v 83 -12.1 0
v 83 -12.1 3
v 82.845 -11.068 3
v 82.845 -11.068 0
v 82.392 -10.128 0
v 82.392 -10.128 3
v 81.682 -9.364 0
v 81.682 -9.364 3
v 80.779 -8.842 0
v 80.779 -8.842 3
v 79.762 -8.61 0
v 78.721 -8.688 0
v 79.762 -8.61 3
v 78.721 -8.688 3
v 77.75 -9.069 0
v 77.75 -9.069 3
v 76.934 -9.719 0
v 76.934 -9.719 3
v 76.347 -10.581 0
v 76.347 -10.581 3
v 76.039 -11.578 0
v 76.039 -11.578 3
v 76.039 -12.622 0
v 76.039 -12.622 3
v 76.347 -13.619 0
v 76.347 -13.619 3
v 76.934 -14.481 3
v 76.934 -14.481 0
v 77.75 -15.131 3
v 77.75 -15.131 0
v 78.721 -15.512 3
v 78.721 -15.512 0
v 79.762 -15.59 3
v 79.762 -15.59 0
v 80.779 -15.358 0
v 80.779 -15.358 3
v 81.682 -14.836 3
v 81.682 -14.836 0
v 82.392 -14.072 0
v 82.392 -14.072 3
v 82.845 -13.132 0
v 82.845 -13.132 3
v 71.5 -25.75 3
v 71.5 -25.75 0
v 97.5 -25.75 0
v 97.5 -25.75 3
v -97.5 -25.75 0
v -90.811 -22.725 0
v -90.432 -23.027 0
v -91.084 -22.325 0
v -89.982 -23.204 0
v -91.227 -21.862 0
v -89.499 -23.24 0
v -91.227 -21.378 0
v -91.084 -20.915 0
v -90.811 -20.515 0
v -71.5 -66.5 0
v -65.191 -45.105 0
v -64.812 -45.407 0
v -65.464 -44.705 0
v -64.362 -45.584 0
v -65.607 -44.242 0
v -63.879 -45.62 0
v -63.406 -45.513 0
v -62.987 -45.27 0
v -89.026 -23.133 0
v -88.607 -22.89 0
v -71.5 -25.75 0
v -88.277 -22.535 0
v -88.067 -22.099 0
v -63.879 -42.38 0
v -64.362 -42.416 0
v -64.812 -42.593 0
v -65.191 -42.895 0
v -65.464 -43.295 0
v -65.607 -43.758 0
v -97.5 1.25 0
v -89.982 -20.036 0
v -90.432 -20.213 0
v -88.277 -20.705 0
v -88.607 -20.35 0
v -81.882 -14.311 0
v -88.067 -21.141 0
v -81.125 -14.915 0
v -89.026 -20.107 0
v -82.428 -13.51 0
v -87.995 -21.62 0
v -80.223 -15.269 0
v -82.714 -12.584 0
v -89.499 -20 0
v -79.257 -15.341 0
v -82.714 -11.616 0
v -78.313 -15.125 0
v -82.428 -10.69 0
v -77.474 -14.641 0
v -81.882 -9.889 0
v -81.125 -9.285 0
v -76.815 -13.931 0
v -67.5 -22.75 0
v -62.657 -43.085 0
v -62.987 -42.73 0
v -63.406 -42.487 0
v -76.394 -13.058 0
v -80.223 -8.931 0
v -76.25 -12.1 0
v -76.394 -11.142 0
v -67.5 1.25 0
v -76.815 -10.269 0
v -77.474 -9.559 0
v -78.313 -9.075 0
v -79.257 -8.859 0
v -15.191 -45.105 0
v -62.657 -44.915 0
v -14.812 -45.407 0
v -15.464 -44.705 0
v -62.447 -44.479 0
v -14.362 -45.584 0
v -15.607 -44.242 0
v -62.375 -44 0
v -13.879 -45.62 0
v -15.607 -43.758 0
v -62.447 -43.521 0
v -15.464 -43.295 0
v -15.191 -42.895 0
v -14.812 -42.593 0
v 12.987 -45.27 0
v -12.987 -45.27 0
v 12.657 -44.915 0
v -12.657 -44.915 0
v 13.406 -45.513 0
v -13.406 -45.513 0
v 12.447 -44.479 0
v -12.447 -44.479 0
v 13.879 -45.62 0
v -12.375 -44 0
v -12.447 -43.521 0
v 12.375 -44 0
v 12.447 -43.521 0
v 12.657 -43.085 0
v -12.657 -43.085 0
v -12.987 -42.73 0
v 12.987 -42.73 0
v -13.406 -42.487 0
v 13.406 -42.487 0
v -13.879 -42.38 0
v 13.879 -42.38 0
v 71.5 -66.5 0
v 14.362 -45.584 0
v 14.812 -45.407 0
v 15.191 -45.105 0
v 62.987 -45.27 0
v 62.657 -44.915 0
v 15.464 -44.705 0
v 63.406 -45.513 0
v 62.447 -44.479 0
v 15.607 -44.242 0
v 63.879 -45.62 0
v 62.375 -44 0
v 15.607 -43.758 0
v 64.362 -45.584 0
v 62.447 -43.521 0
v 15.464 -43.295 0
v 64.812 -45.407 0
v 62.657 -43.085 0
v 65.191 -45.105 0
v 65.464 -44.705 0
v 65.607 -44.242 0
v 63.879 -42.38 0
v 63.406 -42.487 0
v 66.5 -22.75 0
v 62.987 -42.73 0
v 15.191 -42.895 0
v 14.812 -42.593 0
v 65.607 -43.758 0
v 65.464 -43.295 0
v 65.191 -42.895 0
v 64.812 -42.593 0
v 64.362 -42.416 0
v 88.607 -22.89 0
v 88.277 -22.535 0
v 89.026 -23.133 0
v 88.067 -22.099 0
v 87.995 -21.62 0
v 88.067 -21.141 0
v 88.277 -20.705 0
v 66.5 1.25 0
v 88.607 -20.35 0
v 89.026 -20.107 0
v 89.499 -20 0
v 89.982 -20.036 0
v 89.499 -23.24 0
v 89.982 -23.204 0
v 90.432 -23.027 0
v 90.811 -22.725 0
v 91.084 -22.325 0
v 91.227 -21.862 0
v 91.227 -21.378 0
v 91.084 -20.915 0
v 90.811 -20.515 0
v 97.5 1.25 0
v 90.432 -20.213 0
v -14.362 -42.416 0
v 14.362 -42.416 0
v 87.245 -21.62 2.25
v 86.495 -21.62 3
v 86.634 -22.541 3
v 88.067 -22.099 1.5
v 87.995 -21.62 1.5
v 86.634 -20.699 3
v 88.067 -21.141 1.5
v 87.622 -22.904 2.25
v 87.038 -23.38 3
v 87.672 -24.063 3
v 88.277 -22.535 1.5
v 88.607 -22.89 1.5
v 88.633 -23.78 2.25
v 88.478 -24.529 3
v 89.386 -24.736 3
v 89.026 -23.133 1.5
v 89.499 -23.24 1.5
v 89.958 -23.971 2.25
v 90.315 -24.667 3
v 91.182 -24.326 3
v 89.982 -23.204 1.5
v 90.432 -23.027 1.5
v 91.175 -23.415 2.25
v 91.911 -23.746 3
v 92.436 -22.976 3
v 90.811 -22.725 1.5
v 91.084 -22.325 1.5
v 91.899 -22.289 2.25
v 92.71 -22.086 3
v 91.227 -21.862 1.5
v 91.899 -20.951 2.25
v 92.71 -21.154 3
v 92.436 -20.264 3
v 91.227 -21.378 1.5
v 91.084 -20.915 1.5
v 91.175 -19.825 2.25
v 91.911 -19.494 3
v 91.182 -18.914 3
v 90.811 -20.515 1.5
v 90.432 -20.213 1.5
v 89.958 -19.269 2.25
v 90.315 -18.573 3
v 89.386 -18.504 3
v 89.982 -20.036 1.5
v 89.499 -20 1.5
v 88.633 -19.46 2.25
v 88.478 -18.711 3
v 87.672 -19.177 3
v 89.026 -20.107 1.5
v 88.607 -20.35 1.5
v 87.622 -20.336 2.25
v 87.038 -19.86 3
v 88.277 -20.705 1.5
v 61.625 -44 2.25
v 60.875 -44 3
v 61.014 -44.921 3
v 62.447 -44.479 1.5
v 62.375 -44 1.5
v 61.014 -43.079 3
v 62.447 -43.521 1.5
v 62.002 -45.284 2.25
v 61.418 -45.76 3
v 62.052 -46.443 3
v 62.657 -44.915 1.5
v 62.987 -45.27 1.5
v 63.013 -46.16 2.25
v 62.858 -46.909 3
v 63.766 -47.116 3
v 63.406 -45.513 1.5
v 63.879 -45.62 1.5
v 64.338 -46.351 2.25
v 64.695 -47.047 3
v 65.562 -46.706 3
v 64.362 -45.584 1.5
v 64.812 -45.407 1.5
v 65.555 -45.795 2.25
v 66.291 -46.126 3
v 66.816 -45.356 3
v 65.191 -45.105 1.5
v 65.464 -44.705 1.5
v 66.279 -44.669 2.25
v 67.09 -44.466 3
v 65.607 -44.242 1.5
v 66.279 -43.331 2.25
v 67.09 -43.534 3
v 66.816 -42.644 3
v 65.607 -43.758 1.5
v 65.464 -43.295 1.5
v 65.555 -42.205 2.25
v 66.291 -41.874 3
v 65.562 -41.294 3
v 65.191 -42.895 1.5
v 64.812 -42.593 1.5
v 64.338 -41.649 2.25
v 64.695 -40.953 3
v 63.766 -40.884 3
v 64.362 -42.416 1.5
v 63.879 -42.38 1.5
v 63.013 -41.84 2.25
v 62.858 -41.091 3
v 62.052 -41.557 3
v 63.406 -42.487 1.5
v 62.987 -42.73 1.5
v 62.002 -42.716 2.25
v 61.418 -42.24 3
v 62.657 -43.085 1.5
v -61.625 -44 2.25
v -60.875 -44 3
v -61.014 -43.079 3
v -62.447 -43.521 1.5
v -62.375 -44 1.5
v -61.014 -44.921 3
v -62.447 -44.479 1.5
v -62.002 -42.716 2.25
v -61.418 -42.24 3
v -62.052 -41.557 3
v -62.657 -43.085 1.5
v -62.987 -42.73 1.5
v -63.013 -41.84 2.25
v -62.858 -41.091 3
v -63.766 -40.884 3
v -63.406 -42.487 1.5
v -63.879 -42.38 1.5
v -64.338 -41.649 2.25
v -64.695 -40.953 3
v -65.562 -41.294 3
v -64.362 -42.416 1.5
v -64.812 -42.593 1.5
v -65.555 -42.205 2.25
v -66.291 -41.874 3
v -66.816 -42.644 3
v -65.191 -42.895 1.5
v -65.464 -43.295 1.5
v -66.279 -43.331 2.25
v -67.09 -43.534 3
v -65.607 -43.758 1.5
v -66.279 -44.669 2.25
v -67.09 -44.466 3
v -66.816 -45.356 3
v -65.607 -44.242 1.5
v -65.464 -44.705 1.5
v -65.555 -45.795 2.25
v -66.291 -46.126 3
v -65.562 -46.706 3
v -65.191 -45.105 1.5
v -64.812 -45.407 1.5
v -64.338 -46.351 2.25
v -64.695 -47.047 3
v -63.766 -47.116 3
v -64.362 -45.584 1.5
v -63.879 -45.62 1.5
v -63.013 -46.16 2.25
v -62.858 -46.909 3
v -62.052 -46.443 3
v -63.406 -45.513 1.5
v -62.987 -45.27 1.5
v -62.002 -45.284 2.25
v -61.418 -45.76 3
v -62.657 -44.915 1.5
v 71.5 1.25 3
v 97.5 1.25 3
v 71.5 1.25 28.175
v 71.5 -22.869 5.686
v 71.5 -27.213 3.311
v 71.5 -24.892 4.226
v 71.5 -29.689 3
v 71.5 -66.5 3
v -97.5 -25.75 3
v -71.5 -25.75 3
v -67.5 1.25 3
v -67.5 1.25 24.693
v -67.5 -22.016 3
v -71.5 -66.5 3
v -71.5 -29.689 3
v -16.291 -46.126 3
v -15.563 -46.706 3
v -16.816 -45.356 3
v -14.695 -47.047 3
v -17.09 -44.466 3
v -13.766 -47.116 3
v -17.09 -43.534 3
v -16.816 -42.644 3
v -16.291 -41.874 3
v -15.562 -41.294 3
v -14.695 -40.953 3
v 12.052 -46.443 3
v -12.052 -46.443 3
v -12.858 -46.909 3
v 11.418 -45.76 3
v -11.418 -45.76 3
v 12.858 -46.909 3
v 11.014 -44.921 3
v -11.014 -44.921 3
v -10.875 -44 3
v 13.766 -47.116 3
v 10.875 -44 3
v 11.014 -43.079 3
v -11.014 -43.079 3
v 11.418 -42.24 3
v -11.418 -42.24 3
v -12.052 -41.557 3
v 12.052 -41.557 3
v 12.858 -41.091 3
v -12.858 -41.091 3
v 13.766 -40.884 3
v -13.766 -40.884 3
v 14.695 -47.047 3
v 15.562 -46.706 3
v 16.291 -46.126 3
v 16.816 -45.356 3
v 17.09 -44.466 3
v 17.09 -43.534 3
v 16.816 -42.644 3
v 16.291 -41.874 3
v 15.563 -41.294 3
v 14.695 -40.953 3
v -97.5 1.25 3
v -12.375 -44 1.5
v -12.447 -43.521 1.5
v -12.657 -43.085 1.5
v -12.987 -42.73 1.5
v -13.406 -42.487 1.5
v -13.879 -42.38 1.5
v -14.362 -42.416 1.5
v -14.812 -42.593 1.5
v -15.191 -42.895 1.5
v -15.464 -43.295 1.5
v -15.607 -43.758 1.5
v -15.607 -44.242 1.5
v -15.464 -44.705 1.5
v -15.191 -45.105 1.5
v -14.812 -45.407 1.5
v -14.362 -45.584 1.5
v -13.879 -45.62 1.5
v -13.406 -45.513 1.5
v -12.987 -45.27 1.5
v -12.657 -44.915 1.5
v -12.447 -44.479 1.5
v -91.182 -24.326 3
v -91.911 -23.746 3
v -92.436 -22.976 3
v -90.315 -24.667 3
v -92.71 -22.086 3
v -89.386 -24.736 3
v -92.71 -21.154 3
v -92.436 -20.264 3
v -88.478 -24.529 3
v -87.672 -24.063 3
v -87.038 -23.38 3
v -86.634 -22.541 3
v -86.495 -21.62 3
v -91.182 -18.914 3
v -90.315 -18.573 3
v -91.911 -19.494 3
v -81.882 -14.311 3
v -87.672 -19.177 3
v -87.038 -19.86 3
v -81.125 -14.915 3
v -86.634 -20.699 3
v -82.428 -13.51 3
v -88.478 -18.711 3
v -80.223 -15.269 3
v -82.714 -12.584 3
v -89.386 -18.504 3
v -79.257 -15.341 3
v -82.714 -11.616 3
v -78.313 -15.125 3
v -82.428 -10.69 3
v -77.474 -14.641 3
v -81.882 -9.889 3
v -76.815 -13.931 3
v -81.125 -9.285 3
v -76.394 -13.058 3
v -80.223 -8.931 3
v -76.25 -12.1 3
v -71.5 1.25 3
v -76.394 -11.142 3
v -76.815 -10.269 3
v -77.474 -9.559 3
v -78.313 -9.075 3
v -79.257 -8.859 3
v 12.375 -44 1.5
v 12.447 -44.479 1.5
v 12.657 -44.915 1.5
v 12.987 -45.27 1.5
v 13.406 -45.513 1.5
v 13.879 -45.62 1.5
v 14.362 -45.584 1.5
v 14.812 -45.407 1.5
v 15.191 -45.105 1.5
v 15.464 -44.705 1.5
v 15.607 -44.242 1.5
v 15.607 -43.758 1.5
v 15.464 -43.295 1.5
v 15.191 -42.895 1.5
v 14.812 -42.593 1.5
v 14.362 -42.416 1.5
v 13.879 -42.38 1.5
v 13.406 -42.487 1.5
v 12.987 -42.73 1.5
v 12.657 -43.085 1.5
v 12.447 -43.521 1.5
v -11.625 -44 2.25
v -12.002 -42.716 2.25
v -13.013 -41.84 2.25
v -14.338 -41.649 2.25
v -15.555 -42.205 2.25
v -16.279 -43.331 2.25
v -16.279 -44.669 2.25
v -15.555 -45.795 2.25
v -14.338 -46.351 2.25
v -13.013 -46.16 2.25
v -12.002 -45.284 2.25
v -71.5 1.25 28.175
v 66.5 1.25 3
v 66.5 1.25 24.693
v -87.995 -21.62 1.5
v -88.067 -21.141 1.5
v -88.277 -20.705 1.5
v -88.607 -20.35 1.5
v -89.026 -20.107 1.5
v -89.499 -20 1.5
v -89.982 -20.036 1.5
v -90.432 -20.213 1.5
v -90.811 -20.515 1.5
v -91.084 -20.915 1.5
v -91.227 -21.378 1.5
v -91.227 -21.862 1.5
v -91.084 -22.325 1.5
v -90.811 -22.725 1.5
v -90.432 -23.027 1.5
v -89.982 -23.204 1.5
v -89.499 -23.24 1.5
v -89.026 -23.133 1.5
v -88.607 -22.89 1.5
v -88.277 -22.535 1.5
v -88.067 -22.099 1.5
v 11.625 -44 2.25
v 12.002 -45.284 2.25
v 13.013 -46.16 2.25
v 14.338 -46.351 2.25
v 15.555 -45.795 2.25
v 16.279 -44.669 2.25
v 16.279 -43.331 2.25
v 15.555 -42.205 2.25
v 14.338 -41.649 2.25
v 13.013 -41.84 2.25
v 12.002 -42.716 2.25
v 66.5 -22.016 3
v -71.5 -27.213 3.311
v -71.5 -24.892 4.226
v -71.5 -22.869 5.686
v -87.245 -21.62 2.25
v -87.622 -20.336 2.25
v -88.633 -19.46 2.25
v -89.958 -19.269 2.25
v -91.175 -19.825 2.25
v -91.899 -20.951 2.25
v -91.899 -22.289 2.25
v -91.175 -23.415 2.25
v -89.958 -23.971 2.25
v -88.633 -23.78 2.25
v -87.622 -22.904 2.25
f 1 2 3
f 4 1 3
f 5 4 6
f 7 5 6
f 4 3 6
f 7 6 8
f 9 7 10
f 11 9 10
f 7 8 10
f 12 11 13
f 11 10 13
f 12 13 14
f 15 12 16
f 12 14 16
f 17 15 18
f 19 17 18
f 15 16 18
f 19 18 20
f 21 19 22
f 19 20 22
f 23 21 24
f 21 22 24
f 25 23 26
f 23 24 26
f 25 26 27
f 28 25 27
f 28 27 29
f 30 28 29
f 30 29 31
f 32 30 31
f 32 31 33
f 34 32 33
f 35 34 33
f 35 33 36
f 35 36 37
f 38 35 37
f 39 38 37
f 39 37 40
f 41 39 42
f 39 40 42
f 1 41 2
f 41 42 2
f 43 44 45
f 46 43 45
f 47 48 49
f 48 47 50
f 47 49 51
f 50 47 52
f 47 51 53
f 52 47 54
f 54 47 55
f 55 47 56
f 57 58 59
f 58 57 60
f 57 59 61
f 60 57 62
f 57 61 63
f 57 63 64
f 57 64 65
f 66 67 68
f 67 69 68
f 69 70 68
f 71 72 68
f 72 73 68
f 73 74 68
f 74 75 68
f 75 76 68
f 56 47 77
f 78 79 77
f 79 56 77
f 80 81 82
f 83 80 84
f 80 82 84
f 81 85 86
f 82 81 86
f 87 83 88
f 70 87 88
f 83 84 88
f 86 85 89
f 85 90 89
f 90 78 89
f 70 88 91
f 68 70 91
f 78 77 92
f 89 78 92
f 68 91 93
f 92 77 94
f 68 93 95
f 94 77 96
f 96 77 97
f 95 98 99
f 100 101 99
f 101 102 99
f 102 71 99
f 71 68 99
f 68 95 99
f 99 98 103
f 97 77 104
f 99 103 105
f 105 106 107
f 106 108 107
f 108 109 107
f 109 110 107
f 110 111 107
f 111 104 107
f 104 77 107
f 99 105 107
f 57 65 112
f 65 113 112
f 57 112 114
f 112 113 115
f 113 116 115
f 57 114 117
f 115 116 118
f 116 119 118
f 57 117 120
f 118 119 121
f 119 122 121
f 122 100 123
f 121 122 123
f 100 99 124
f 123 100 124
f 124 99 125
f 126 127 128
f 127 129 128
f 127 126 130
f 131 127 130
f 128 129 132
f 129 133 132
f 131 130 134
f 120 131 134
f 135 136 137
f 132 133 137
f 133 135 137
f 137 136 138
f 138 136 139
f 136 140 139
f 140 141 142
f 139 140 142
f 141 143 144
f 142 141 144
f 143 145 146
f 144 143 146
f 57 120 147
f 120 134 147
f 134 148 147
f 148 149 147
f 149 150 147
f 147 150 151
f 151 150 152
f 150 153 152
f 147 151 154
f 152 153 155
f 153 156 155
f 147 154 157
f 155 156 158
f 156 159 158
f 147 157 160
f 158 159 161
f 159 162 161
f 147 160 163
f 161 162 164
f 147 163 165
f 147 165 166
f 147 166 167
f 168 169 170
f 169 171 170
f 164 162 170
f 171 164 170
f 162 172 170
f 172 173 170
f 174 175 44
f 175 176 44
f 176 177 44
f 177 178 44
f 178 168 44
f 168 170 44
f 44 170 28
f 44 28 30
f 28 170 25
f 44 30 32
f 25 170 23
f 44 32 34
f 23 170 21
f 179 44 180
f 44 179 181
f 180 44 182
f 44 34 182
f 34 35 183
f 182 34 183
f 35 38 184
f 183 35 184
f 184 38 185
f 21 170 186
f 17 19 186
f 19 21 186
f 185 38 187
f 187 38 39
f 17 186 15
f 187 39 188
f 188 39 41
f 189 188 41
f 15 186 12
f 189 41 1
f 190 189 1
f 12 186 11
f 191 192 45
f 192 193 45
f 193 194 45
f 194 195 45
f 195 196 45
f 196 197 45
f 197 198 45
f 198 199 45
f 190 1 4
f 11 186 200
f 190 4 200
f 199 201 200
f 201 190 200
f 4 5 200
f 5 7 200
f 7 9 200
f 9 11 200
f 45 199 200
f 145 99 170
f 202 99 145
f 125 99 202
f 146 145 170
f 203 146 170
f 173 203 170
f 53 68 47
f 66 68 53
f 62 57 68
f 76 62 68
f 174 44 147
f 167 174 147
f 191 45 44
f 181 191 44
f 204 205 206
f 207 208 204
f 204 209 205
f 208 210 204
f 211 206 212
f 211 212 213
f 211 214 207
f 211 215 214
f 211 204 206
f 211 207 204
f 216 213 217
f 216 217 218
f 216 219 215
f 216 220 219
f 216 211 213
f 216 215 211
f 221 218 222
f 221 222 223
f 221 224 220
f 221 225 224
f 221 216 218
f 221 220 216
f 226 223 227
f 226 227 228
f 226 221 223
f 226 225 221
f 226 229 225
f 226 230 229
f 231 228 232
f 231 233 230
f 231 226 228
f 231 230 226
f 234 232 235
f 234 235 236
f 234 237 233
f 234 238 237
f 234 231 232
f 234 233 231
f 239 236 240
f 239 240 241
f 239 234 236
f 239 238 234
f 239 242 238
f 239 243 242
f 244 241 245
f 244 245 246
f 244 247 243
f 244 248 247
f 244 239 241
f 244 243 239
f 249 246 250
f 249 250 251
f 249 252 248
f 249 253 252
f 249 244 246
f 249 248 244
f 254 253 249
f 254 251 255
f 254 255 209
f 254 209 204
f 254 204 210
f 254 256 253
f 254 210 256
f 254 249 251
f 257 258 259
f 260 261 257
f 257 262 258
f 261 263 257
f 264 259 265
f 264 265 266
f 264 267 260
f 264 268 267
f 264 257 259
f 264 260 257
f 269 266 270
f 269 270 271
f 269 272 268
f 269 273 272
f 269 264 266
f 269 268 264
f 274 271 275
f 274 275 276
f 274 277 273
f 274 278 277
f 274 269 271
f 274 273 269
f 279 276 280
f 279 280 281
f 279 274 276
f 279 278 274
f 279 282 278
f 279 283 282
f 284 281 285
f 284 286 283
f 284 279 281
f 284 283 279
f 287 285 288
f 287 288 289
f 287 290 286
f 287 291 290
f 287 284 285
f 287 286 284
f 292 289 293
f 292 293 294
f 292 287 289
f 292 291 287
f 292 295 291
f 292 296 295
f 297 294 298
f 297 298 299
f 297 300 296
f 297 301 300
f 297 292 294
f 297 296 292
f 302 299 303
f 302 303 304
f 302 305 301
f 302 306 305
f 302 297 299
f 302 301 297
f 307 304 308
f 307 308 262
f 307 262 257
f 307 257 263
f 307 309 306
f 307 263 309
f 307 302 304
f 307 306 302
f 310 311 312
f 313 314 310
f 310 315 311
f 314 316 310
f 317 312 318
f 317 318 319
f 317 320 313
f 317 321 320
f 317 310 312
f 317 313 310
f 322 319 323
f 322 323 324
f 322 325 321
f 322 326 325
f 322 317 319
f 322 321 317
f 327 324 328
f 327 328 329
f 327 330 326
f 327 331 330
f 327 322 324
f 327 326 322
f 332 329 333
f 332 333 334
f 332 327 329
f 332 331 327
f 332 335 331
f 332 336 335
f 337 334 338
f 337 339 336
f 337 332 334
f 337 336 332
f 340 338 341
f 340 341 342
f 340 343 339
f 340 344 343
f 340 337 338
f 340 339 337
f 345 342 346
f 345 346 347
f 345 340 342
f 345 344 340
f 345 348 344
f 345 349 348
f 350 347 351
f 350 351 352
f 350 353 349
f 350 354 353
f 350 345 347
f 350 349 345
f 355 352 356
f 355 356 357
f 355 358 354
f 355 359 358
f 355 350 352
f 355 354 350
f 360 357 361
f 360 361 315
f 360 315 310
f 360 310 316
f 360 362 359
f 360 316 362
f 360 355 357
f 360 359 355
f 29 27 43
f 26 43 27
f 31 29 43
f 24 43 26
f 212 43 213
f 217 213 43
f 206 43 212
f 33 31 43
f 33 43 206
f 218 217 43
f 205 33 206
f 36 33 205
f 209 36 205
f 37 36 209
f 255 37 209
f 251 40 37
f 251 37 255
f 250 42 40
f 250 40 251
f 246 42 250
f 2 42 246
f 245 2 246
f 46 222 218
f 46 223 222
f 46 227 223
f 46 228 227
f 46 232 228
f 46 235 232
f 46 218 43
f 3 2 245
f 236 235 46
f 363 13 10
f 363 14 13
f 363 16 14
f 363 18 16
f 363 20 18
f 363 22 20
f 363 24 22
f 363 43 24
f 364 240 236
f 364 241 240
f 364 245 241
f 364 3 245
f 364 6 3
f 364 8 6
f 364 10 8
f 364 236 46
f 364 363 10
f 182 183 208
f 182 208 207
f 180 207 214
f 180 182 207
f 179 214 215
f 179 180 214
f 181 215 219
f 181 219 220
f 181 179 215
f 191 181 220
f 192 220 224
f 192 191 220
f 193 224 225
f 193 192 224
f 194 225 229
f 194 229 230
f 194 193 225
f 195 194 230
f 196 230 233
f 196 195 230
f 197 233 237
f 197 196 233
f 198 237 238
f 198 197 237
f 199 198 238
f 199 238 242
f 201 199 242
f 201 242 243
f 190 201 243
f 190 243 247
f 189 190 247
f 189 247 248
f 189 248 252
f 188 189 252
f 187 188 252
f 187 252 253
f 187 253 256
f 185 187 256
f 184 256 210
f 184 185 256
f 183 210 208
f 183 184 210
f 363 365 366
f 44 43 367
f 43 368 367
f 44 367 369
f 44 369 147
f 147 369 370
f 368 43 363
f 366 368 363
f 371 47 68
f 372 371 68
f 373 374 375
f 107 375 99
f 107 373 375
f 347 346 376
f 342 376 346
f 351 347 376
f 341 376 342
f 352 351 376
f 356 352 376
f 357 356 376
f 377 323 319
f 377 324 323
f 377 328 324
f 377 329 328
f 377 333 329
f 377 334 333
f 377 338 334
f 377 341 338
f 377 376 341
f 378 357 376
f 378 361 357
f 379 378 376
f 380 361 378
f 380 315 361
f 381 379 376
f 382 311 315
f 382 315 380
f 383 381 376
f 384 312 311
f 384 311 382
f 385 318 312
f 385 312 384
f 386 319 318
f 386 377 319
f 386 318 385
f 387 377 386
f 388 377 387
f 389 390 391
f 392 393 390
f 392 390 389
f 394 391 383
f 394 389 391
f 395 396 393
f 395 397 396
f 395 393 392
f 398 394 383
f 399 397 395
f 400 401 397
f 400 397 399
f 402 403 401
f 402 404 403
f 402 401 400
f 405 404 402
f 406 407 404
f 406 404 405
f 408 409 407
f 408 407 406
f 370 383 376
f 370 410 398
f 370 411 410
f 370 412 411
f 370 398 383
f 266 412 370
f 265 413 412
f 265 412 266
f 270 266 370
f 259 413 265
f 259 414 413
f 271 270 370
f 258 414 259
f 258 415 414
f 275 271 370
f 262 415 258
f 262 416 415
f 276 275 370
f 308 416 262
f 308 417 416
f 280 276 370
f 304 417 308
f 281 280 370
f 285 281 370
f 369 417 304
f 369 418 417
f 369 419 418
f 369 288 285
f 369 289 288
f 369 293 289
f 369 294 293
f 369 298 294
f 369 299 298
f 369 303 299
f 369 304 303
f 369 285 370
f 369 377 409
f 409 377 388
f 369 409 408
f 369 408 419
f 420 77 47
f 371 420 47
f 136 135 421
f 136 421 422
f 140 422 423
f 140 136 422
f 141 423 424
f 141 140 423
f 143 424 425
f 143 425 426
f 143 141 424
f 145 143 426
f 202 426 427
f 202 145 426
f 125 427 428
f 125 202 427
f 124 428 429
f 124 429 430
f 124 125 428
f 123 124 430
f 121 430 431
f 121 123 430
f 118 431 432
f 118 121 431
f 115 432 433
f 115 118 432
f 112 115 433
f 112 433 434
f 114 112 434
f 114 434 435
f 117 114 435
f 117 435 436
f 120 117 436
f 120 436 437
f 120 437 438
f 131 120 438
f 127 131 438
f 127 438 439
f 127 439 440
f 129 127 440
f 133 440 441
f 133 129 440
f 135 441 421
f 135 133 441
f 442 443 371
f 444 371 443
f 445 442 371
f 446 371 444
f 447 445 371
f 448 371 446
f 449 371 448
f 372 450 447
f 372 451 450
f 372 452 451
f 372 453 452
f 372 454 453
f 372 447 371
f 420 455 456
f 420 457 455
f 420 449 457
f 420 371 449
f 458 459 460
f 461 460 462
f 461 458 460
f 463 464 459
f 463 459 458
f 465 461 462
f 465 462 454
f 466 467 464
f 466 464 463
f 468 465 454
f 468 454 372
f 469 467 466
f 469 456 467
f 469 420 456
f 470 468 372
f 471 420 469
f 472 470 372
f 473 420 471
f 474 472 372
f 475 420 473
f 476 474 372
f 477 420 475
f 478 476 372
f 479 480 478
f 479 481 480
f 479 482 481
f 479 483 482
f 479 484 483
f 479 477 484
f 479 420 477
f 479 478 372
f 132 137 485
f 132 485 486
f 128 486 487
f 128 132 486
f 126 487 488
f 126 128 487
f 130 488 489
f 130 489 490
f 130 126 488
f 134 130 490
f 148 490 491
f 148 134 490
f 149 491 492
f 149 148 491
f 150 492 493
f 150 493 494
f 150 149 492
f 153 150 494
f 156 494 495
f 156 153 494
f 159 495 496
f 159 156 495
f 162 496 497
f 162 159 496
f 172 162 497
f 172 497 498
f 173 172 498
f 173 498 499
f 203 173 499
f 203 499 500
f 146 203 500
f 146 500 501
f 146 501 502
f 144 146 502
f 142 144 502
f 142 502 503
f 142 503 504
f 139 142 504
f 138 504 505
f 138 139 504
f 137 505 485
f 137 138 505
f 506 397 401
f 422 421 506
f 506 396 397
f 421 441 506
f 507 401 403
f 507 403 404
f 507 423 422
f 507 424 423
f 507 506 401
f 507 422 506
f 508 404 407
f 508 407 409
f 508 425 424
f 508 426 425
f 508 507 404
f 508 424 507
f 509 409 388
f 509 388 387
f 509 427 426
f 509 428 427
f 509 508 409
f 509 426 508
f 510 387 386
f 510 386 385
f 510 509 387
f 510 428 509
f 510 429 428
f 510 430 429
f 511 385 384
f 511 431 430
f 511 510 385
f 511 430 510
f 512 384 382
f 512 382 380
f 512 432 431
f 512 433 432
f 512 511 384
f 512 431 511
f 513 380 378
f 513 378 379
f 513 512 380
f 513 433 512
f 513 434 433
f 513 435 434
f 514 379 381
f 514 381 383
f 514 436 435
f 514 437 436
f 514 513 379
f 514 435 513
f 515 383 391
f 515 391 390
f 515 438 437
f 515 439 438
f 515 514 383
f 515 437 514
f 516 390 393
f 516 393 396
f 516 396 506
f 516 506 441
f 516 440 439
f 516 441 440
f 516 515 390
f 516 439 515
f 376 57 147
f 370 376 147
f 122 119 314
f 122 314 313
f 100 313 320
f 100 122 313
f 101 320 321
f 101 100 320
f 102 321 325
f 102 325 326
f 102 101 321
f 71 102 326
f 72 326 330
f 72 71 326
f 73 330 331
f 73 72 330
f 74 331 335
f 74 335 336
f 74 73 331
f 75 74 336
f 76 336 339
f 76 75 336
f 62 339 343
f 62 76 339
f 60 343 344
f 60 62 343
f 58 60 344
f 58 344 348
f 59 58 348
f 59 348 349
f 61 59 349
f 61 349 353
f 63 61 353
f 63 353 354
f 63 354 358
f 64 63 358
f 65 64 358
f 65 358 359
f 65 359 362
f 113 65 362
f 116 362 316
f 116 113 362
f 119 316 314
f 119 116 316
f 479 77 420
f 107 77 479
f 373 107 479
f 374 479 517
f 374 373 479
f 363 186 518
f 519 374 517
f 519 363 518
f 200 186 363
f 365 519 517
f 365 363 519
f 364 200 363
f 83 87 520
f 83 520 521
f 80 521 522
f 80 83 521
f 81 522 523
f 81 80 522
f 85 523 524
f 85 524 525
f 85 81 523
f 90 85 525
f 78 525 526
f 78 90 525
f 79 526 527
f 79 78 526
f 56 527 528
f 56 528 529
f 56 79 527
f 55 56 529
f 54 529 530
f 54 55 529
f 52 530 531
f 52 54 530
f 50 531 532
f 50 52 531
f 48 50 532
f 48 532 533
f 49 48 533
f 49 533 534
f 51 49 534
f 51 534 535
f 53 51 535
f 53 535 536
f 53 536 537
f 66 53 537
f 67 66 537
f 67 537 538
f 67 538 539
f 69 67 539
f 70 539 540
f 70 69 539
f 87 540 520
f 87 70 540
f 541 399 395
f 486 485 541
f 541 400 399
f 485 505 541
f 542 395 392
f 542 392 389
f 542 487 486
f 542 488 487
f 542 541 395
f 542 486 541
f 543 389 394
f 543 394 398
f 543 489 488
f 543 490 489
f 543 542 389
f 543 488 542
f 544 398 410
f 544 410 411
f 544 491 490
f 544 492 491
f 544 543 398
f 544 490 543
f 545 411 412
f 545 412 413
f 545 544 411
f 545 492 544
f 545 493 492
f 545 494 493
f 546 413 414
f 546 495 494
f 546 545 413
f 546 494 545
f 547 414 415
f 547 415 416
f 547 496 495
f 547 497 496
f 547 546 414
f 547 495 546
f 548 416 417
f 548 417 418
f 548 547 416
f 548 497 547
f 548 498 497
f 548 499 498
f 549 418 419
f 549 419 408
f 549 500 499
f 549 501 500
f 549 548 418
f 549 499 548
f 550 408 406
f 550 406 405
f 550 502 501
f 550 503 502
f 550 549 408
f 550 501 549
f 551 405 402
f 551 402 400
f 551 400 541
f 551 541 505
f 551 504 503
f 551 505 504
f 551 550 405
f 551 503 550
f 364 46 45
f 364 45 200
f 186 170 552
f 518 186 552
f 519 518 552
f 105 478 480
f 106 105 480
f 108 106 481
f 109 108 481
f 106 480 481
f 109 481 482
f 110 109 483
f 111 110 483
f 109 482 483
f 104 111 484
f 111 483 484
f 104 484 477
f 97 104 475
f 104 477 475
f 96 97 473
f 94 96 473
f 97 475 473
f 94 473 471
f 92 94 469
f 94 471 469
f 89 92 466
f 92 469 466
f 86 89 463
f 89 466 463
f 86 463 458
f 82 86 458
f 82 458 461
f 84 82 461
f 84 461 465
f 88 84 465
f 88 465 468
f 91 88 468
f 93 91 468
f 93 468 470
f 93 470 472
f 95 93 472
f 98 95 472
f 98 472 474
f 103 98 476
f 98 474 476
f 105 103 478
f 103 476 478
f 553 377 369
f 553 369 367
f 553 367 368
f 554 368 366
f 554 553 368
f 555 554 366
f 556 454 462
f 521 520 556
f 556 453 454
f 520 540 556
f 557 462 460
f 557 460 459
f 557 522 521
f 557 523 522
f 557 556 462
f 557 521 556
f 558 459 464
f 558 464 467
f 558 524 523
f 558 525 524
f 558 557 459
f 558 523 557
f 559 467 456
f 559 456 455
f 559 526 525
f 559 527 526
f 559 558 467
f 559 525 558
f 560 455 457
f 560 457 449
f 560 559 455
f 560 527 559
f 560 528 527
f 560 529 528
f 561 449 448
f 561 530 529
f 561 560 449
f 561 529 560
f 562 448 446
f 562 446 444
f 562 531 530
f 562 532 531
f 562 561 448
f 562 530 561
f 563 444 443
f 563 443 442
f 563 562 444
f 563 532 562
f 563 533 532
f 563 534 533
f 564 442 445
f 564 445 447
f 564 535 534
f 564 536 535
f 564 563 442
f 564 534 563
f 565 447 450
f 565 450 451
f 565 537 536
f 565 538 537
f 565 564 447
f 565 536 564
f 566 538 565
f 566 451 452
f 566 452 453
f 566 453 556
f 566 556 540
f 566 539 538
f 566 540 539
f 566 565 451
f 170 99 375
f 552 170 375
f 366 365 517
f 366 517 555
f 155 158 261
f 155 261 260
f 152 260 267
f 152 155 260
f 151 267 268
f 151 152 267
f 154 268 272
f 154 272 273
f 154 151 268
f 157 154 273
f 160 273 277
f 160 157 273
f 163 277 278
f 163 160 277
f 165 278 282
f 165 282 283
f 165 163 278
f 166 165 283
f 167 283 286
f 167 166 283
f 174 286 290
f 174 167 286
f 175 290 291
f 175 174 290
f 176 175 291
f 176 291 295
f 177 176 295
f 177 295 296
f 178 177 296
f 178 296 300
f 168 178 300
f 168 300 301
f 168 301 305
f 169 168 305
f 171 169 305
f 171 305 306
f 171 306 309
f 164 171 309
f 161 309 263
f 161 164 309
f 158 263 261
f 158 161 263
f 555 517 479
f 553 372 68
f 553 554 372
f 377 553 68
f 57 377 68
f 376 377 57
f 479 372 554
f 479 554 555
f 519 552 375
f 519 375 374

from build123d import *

# Parameters (mm, degrees)
CROQUIS1_R                  = 1.625
SALIENTE_EXTRUIR1_DEPTH     = 3
CROQUIS2_W                  = 143
CROQUIS2_H                  = 24
SALIENTE_EXTRUIR2_DEPTH     = 13
CORTAR_EXTRUIR1_START       = -4
CORTAR_EXTRUIR1_DEPTH       = 134
CORTAR_EXTRUIR2_DEPTH       = 183.316345948
CORTAR_EXTRUIR2_DEPTH_BACK  = 183.316345948
SALIENTE_EXTRUIR3_DEPTH     = 1
CHAFL_N1_SIZE               = 1.5
CROQUIS7_R                  = 6
CORTAR_EXTRUIR3_DEPTH       = 10
CROQUIS11_R                 = 5
CORTAR_EXTRUIR7_DEPTH       = 60
CORTAR_EXTRUIR8_DEPTH       = 183.40682554
CORTAR_EXTRUIR8_DEPTH_BACK  = 183.40682554
CROQUIS12_W                 = 39.754544999
CROQUIS12_H                 = 27.919936099
CORTAR_EXTRUIR9_DEPTH       = 119.057189531
CORTAR_EXTRUIR9_DEPTH_BACK  = 119.057189531
CROQUIS13_W                 = 134.117881028
CROQUIS13_H                 = 3.734427539
CORTAR_EXTRUIR10_DEPTH      = 207.049144623
CORTAR_EXTRUIR10_DEPTH_BACK = 207.049144623
CROQUIS14_W                 = 4.069621889
CROQUIS14_H                 = 4.224509549
CROQUIS22_W                 = 31
CROQUIS22_H                 = 6.734427539
SALIENTE_EXTRUIR9_DEPTH     = 3
CROQUIS23_W                 = 15.138367264
CROQUIS23_H                 = 34.152206442
CORTAR_EXTRUIR11_DEPTH      = 10
SALIENTE_EXTRUIR4_START     = -5
SALIENTE_EXTRUIR4_DEPTH     = 5
SALIENTE_EXTRUIR5_START     = -4
SALIENTE_EXTRUIR5_DEPTH     = 4
SALIENTE_EXTRUIR6_START     = -138
SALIENTE_EXTRUIR6_DEPTH     = 134
CROQUIS18_R                 = 6
SALIENTE_EXTRUIR7_DEPTH     = 3
REDONDEO1_R                 = 10
CROQUIS19_R                 = 5
CROQUIS19_R_2               = 3.25
CROQUIS19_R_3               = 3.5
SALIENTE_EXTRUIR8_DEPTH     = 3


with BuildPart() as part:
    # Croquis1 → Saliente-Extruir1 (new body)
    with BuildSketch(Plane.XY):
        Polygon((-97.5, -1.75), (-97.5, -25.75), (-71.5, -25.75), (-71.5, -66.5), (71.5, -66.5), (71.5, -25.75), (97.5, -25.75), (97.5, -1.75), align=None)
        with Locations((-89.62, -21.62)):
            Circle(CROQUIS1_R, mode=Mode.SUBTRACT)
        with Locations((-64, -44)):
            Circle(CROQUIS1_R, mode=Mode.SUBTRACT)
        with Locations((-14, -44)):
            Circle(CROQUIS1_R, mode=Mode.SUBTRACT)
        with Locations(Location((14, -44, 0), (0, 0, 180))):
            Circle(CROQUIS1_R, mode=Mode.SUBTRACT)
        with Locations(Location((64, -44, 0), (0, 0, 180))):
            Circle(CROQUIS1_R, mode=Mode.SUBTRACT)
        with Locations(Location((89.62, -21.62, 0), (0, 0, 180))):
            Circle(CROQUIS1_R, mode=Mode.SUBTRACT)
    extrude(amount=SALIENTE_EXTRUIR1_DEPTH)

    # Croquis2 → Saliente-Extruir2 (add)
    with BuildSketch(Plane.XY.offset(3)):
        with Locations((0, -13.75)):
            Rectangle(CROQUIS2_W, CROQUIS2_H)
    extrude(amount=SALIENTE_EXTRUIR2_DEPTH)

    # Croquis4 → Cortar-Extruir1 (cut)
    with BuildSketch(Plane.ZY.offset(71.5).offset(CORTAR_EXTRUIR1_START)):
        Polygon((0, -22.75), (12.254442441, -19.75), (12.254442441, -7.75), (0, -4.75), align=None)
    extrude(amount=-CORTAR_EXTRUIR1_DEPTH, mode=Mode.SUBTRACT)

    # Croquis5 → Cortar-Extruir2 (cut, two sides: drawn at the far end of the back side and taken through both)
    with BuildSketch(Plane.ZY.offset(71.5).offset(-CORTAR_EXTRUIR2_DEPTH_BACK)):
        Polygon((3, -25.75), (16, -22.567480666), (16, -5.666946873), (0, -1.75), (13.126652557, 3.411104472), (22.490929508, -3.111277484), (22.490929508, -28.232984682), align=None)
    extrude(amount=CORTAR_EXTRUIR2_DEPTH + CORTAR_EXTRUIR2_DEPTH_BACK, mode=Mode.SUBTRACT)

    # Croquis6 → Saliente-Extruir3 (add)
    # profile 1 of 3: a face of its own
    with BuildSketch(Plane.XY.offset(16)):
        with BuildLine():
            Line((-11.048076923, -8.067480666), (-8.963942308, -8.067480666))
            add(Edge.make_bspline(
                [(-8.963942308, -8.067480666), (-8.809276988, -8.068112716), (-8.511063659, -8.069331385), (-8.082223191, -8.086660848), (-7.688620597, -8.112805667), (-7.330723888, -8.147308935), (-7.008234257, -8.195180289), (-6.72182234, -8.25265944), (-6.469658762, -8.316670483), (-6.318437154, -8.376153718), (-6.247596154, -8.404019127)],
                knots=[0, 0, 0, 0, 1.348808202, 2.600664361, 3.742342956, 4.788858012, 5.735658768, 6.584006912, 7.336666444, 8, 8, 8, 8], degree=3))
            add(Edge.make_bspline(
                [(-6.247596154, -8.404019127), (-6.167838297, -8.439986111), (-6.01192431, -8.510295871), (-5.788508653, -8.62947523), (-5.57929728, -8.757863745), (-5.387757493, -8.900302082), (-5.209847212, -9.050792623), (-5.046669639, -9.210766732), (-4.899538696, -9.382679515), (-4.766910273, -9.563447492), (-4.648977655, -9.752836862), (-4.547744652, -9.951781558), (-4.460210228, -10.158597262), (-4.391853098, -10.375534491), (-4.335040106, -10.599989157), (-4.298295523, -10.833377416), (-4.27243642, -11.07491201), (-4.270311593, -11.238882429), (-4.269230769, -11.322288358)],
                knots=[0, 0, 0, 0, 1.116361014, 2.182309107, 3.229450697, 4.24598407, 5.225421932, 6.201651319, 7.158895679, 8.110002388, 9.060669178, 10.002827475, 10.956240434, 11.923213192, 12.902917952, 13.908279153, 14.936015885, 16, 16, 16, 16], degree=3))
            add(Edge.make_bspline(
                [(-4.269230769, -11.322288358), (-4.271772595, -11.424925094), (-4.276790571, -11.627546629), (-4.309579081, -11.926339339), (-4.370733726, -12.213061963), (-4.453090589, -12.488617706), (-4.555124128, -12.754790758), (-4.686709728, -13.006949511), (-4.838806317, -13.249487522), (-5.014462356, -13.47922496), (-5.210800272, -13.698269295), (-5.437501776, -13.893729522), (-5.68202542, -14.078750894), (-5.954416581, -14.240928545), (-6.247183828, -14.39157714), (-6.567004768, -14.519215786), (-6.907876863, -14.637006555), (-7.14689016, -14.695959195), (-7.269230769, -14.726134512)],
                knots=[0, 0, 0, 0, 0.995453645, 1.965186658, 2.910129054, 3.83459069, 4.752398018, 5.669942118, 6.588407184, 7.525617038, 8.471772905, 9.435289717, 10.423772802, 11.441988612, 12.505459691, 13.613754905, 14.778583949, 16, 16, 16, 16], degree=3))
            Line((-7.269230769, -14.726134512), (-4.5, -20.067480666))
            Line((-4.5, -20.067480666), (-6.90625, -20.067480666))
            Line((-6.90625, -20.067480666), (-9.617788462, -14.836711435))
            Line((-9.617788462, -14.836711435), (-9.822115385, -14.836711435))
            Line((-9.822115385, -14.836711435), (-10.557692308, -20.067480666))
            Line((-10.557692308, -20.067480666), (-12.730769231, -20.067480666))
            Line((-12.730769231, -20.067480666), (-11.048076923, -8.067480666))
        make_face()
        with BuildLine():
            add(Edge.make_bspline(
                [(-9.540865385, -12.836711435), (-9.386195416, -12.835275241), (-9.090350679, -12.832528164), (-8.667825913, -12.813420248), (-8.28680605, -12.783236682), (-7.948389952, -12.740102395), (-7.651687406, -12.689090143), (-7.397958815, -12.625404989), (-7.186041205, -12.549684501), (-7.012592097, -12.459887562), (-6.872086372, -12.354457197), (-6.750472631, -12.241946473), (-6.649207312, -12.116003172), (-6.565654347, -11.978741621), (-6.5012127, -11.829877316), (-6.454740309, -11.668401722), (-6.429045355, -11.495391495), (-6.425095306, -11.376054994), (-6.423076923, -11.31507682)],
                knots=[0, 0, 0, 0, 1.892208387, 3.619318591, 5.173427176, 6.566868293, 7.791773198, 8.8545744, 9.763297566, 10.539470204, 11.233547833, 11.906251103, 12.5615143, 13.203742025, 13.866659999, 14.539934446, 15.25394049, 16, 16, 16, 16], degree=3))
            add(Edge.make_bspline(
                [(-6.423076923, -11.31507682), (-6.425689641, -11.245936375), (-6.430757957, -11.11181339), (-6.474596815, -10.918637614), (-6.549559753, -10.743400948), (-6.654909947, -10.587778732), (-6.786381326, -10.450558767), (-6.946769202, -10.337542298), (-7.134240875, -10.248576591), (-7.309857115, -10.189799645), (-7.476087089, -10.155754532), (-7.631045454, -10.132880777), (-7.814511833, -10.110808419), (-8.027038079, -10.094486606), (-8.26836871, -10.083690031), (-8.538380856, -10.073198835), (-8.836529796, -10.069468107), (-9.044872334, -10.068163199), (-9.153846154, -10.067480666)],
                knots=[0, 0, 0, 0, 0.974340854, 1.890087692, 2.776057671, 3.647490651, 4.526730822, 5.442477659, 6.397820337, 7.445016909, 8.045730266, 8.789007992, 9.653967296, 10.651691253, 11.794598421, 13.061237498, 14.462876682, 16, 16, 16, 16], degree=3))
            Line((-9.153846154, -10.067480666), (-9.540865385, -12.836711435))
        make_face(mode=Mode.SUBTRACT)
    # profile 2 of 3: a face of its own
    with BuildSketch(Plane.XY.offset(16)):
        Polygon((1.884615385, -8.067480666), (4.180288462, -8.067480666), (6.012019231, -12.807865281), (9.425480769, -8.067480666), (12.033653846, -8.067480666), (6.838942308, -15.28382682), (6.209134615, -20.067480666), (4.038461538, -20.067480666), (4.670673077, -15.271807589), align=None)
    # profile 3 of 3: a face of its own
    with BuildSketch(Plane.XY.offset(16)):
        with BuildLine():
            add(Edge.make_bspline(
                [(24.487980769, -7.759788358), (24.690145883, -7.764031221), (25.087091072, -7.772361955), (25.668927957, -7.849024893), (26.224011967, -7.972589701), (26.750990661, -8.149778703), (27.251887383, -8.373625801), (27.725496832, -8.64948879), (28.171301864, -8.975420649), (28.585672586, -9.347005104), (28.961013577, -9.756424421), (29.293862045, -10.194630861), (29.570289093, -10.663617643), (29.797934343, -11.158162459), (29.977385898, -11.67880605), (30.099797668, -12.228050386), (30.180599156, -12.802256134), (30.188356974, -13.194600078), (30.192307692, -13.394403743)],
                knots=[0, 0, 0, 0, 1.079937363, 2.120424901, 3.130164457, 4.114608815, 5.086352068, 6.057283592, 7.037967613, 8.032612779, 9.026667848, 10.002130715, 10.967845321, 11.92966918, 12.907375778, 13.904589319, 14.932898699, 16, 16, 16, 16], degree=3))
            add(Edge.make_bspline(
                [(30.192307692, -13.394403743), (30.189777514, -13.549969057), (30.184745184, -13.859376411), (30.136860197, -14.319433848), (30.062261858, -14.772962365), (29.960118985, -15.22009286), (29.823390606, -15.659391242), (29.660180669, -16.093460312), (29.46547734, -16.520524116), (29.241871054, -16.937274794), (28.996915489, -17.338803359), (28.7284292, -17.718478392), (28.439993147, -18.074046587), (28.132714318, -18.406907786), (27.803274713, -18.712605848), (27.458113362, -18.997544901), (27.089752961, -19.255248214), (26.704041226, -19.490638964), (26.300172025, -19.699838611), (25.880874397, -19.880651571), (25.446694054, -20.031827723), (24.998656183, -20.156810905), (24.535654153, -20.256242446), (24.057773688, -20.324929749), (23.564847151, -20.366615352), (23.231652765, -20.37229141), (23.0625, -20.375172973)],
                knots=[0, 0, 0, 0, 1.005311864, 1.999487392, 2.986390894, 3.975195422, 4.961487101, 5.958115224, 6.97104375, 7.992937587, 9.013623077, 10.009524137, 10.996414046, 11.971324635, 12.935123389, 13.899409138, 14.862205298, 15.838449601, 16.81836937, 17.799766407, 18.787539403, 19.787875373, 20.804768927, 21.846385261, 22.906674593, 24, 24, 24, 24], degree=3))
            add(Edge.make_bspline(
                [(23.0625, -20.375172973), (22.853135899, -20.370858389), (22.444328213, -20.362433662), (21.848518981, -20.288026789), (21.284795586, -20.171851994), (20.753132043, -20.005539058), (20.252537915, -19.791081257), (19.784665176, -19.527933243), (19.348368226, -19.218964103), (18.95096102, -18.86198382), (18.589596339, -18.470409943), (18.279289135, -18.040986521), (18.01132057, -17.585306791), (17.798725719, -17.095904155), (17.628612138, -16.578784265), (17.510091564, -16.030972392), (17.435973691, -15.453330543), (17.427441159, -15.058097005), (17.423076923, -14.855942204)],
                knots=[0, 0, 0, 0, 1.129126937, 2.20475128, 3.23403939, 4.230775744, 5.204839333, 6.16680792, 7.121629951, 8.083044708, 9.04383724, 9.990659777, 10.936010704, 11.890255174, 12.863608629, 13.868449271, 14.909750384, 16, 16, 16, 16], degree=3))
            add(Edge.make_bspline(
                [(17.423076923, -14.855942204), (17.428320242, -14.624869771), (17.438644619, -14.169875797), (17.52940159, -13.500129748), (17.668126056, -12.853643656), (17.872529982, -12.233852573), (18.130311731, -11.638404639), (18.447815919, -11.06928239), (18.820122992, -10.521870887), (19.110384087, -10.185000587), (19.257211538, -10.01459605)],
                knots=[0, 0, 0, 0, 1.045740506, 2.05911896, 3.05467723, 4.035585325, 5.008815224, 5.988058098, 6.982266978, 8, 8, 8, 8], degree=3))
            add(Edge.make_bspline(
                [(19.257211538, -10.01459605), (19.342684328, -9.922203908), (19.51209099, -9.739083119), (19.783215845, -9.484603753), (20.06097764, -9.246349173), (20.349308035, -9.027147767), (20.643852388, -8.821908403), (20.949304268, -8.637099729), (21.264508226, -8.470716347), (21.586036115, -8.318996359), (21.919420196, -8.189450626), (22.258897756, -8.073377572), (22.609179935, -7.977606464), (22.967797996, -7.898338686), (23.335095226, -7.835310389), (23.711559619, -7.793010431), (24.096550714, -7.765636615), (24.356523498, -7.761752428), (24.487980769, -7.759788358)],
                knots=[0, 0, 0, 0, 1.027812829, 2.037120149, 3.035266778, 4.015768311, 4.994345575, 5.966422343, 6.929711672, 7.904780536, 8.86860337, 9.849672715, 10.834163809, 11.833018336, 12.848777673, 13.876590502, 14.926281379, 16, 16, 16, 16], degree=3))
        make_face()
        with BuildLine():
            add(Edge.make_bspline(
                [(24.4375, -9.759788358), (24.328447387, -9.761418674), (24.111488075, -9.764662176), (23.790362866, -9.797280367), (23.475697903, -9.847819491), (23.168815306, -9.917080446), (22.868242731, -10.006469212), (22.576026578, -10.116936735), (22.290007834, -10.247670757), (22.013339819, -10.398523989), (21.745094417, -10.566746314), (21.490872977, -10.754485143), (21.248887858, -10.959052925), (21.023212093, -11.18405633), (20.808889976, -11.424872132), (20.606521464, -11.681986732), (20.418634071, -11.957904331), (20.244392114, -12.248035341), (20.089720762, -12.550000292), (19.952338208, -12.854508864), (19.835416748, -13.161604404), (19.742691091, -13.472121892), (19.666996063, -13.784816529), (19.614508511, -14.100512176), (19.581919, -14.418547712), (19.578590145, -14.63150578), (19.576923077, -14.738153743)],
                knots=[0, 0, 0, 0, 1.015557909, 2.02044445, 3.003357477, 3.982977463, 4.948851735, 5.922052592, 6.890662853, 7.875953625, 8.855459861, 9.837777552, 10.817397539, 11.804383193, 12.803598646, 13.818964529, 14.849984807, 15.911175445, 16.969421976, 18.008462528, 19.021851172, 20.027762868, 21.025304218, 22.016795393, 23.006824523, 24, 24, 24, 24], degree=3))
            add(Edge.make_bspline(
                [(19.576923077, -14.738153743), (19.579554921, -14.862493068), (19.584733218, -15.107137502), (19.62985602, -15.46726908), (19.699769416, -15.813989217), (19.805563564, -16.144424323), (19.934112881, -16.462147128), (20.097326515, -16.762409031), (20.284948891, -17.051147187), (20.503012874, -17.321027274), (20.746578093, -17.570198979), (21.021361871, -17.785169726), (21.320372429, -17.968728653), (21.644893978, -18.118096904), (21.994659132, -18.234678513), (22.370567325, -18.313898162), (22.770964471, -18.366393766), (23.046299029, -18.372196918), (23.1875, -18.375172973)],
                knots=[0, 0, 0, 0, 1.032572517, 2.031642993, 3.01079972, 3.966643664, 4.909863955, 5.853952978, 6.801111379, 7.766917104, 8.731873648, 9.689385086, 10.65752794, 11.640388645, 12.650815691, 13.713650281, 14.827481725, 16, 16, 16, 16], degree=3))
            add(Edge.make_bspline(
                [(23.1875, -18.375172973), (23.352788185, -18.371267675), (23.679167101, -18.363556252), (24.158560502, -18.294872985), (24.618756292, -18.180856063), (25.059793976, -18.025050504), (25.481815634, -17.823391072), (25.884831734, -17.577269923), (26.267802401, -17.284339207), (26.627646907, -16.95226102), (26.958207141, -16.589806943), (27.247161365, -16.20243939), (27.492552605, -15.795258336), (27.692480371, -15.369154171), (27.847171329, -14.923409671), (27.957444954, -14.458807988), (28.027034101, -13.975037009), (28.03462008, -13.645441832), (28.038461538, -13.478538358)],
                knots=[0, 0, 0, 0, 1.03369803, 2.041145535, 3.022357397, 3.995919545, 4.96236968, 5.943376615, 6.945032455, 7.973917545, 9.003120129, 10.009769043, 10.992465341, 11.972511115, 12.949140339, 13.93890809, 14.956285095, 16, 16, 16, 16], degree=3))
            add(Edge.make_bspline(
                [(28.038461538, -13.478538358), (28.036245406, -13.341360283), (28.031902288, -13.072522213), (27.981755136, -12.68105056), (27.905579854, -12.310002908), (27.798497608, -11.959493941), (27.654266016, -11.631495582), (27.485057282, -11.321970211), (27.280132488, -11.03616901), (27.047907563, -10.773147054), (26.79116339, -10.534153573), (26.511117013, -10.328091437), (26.213858009, -10.149180232), (25.894302371, -10.00960188), (25.558232415, -9.89383052), (25.201686968, -9.815996795), (24.825727742, -9.770032092), (24.569043318, -9.763259245), (24.4375, -9.759788358)],
                knots=[0, 0, 0, 0, 1.12845219, 2.211511647, 3.242392028, 4.243671568, 5.221368115, 6.186708094, 7.141970352, 8.109200861, 9.070590294, 10.022934043, 10.966237583, 11.91979086, 12.887493425, 13.887534174, 14.917422563, 16, 16, 16, 16], degree=3))
        make_face(mode=Mode.SUBTRACT)
    extrude(amount=SALIENTE_EXTRUIR3_DEPTH)

    # Chaflán1
    chafl_n1_edges = [part.edges().sort_by_distance(p)[0] for p in [
        (-91.245, -21.62, 3),
        (-65.625, -44, 3),
        (-15.625, -44, 3),
        (15.625, -44, 3),
        (65.625, -44, 3),
        (91.245, -21.62, 3),
    ]]
    chamfer(chafl_n1_edges, length=CHAFL_N1_SIZE)

    # Croquis7 → Cortar-Extruir3 (cut)
    with BuildSketch(Plane.XY.offset(3)):
        with Locations((0, -33.75)):
            Circle(CROQUIS7_R)
    extrude(amount=-CORTAR_EXTRUIR3_DEPTH, mode=Mode.SUBTRACT)

    # Croquis11 → Cortar-Extruir7 (cut)
    with BuildSketch(Plane.XY.offset(3)):
        with Locations((-79.5, -12.1)):
            Circle(CROQUIS11_R)
        with Locations(Location((79.5, -12.1, 0), (0, 0, 180))):
            Circle(CROQUIS11_R)
    extrude(amount=-CORTAR_EXTRUIR7_DEPTH, mode=Mode.SUBTRACT)

    # Croquis12 → Cortar-Extruir8 (cut, two sides: drawn at the far end of the back side and taken through both)
    with BuildSketch(Plane(origin=(71.5, 0, 0), x_dir=(0, 0, -1), z_dir=(1, 0, 0)).offset(-CORTAR_EXTRUIR8_DEPTH_BACK)):
        with Locations((-22.8772725, -11.79003195)):
            Rectangle(CROQUIS12_W, CROQUIS12_H)
    extrude(amount=CORTAR_EXTRUIR8_DEPTH + CORTAR_EXTRUIR8_DEPTH_BACK, mode=Mode.SUBTRACT)

    # Croquis13 → Cortar-Extruir9 (cut, two sides: drawn at the far end of the back side and taken through both)
    with BuildSketch(Plane.XY.offset(3).offset(-CORTAR_EXTRUIR9_DEPTH_BACK)):
        with Locations((-0.441059486, -3.61721377)):
            Rectangle(CROQUIS13_W, CROQUIS13_H)
    extrude(amount=CORTAR_EXTRUIR9_DEPTH + CORTAR_EXTRUIR9_DEPTH_BACK, mode=Mode.SUBTRACT)

    # Croquis14 → Cortar-Extruir10 (cut, two sides: drawn at the far end of the back side and taken through both)
    with BuildSketch(Plane(origin=(97.5, 0, 0), x_dir=(0, 0, -1), z_dir=(1, 0, 0)).offset(-CORTAR_EXTRUIR10_DEPTH_BACK)):
        with Locations((-0.965189056, -0.372172765)):
            Rectangle(CROQUIS14_W, CROQUIS14_H)
    extrude(amount=CORTAR_EXTRUIR10_DEPTH + CORTAR_EXTRUIR10_DEPTH_BACK, mode=Mode.SUBTRACT)

    # Croquis22 → Saliente-Extruir9 (add)
    with BuildSketch(Plane.XY.offset(3)):
        with Locations((82, -2.11721377)):
            Rectangle(CROQUIS22_W, CROQUIS22_H)
        with Locations((-82, -2.11721377)):
            Rectangle(CROQUIS22_W, CROQUIS22_H)
    extrude(amount=-SALIENTE_EXTRUIR9_DEPTH)

    # Croquis23 → Cortar-Extruir11 (cut)
    with BuildSketch(Plane.XY.offset(3)):
        with Locations((-59.930816368, 11.591675682)):
            Rectangle(CROQUIS23_W, CROQUIS23_H)
    extrude(amount=-CORTAR_EXTRUIR11_DEPTH, mode=Mode.SUBTRACT)

    # Croquis15 → Saliente-Extruir4 (add)
    with BuildSketch(Plane(origin=(71.5, 0, 0), x_dir=(0, 0, -1), z_dir=(1, 0, 0)).offset(SALIENTE_EXTRUIR4_START)):
        Polygon((-3, -25.75), (-28.175174424, 1.25), (-3, 1.25), align=None)
    extrude(amount=SALIENTE_EXTRUIR4_DEPTH)

    # Croquis16 → Saliente-Extruir5 (add)
    with BuildSketch(Plane.ZY.offset(71.5).offset(SALIENTE_EXTRUIR5_START)):
        Polygon((3, 1.25), (28.175174424, 1.25), (3, -25.75), align=None)
    extrude(amount=SALIENTE_EXTRUIR5_DEPTH)

    # Croquis17 → Saliente-Extruir6 (add)
    with BuildSketch(Plane.ZY.offset(71.5).offset(SALIENTE_EXTRUIR6_START)):
        Polygon((3, -22.015572461), (24.6931424, 1.25), (28.175174424, 1.25), (3, -25.75), align=None)
    extrude(amount=SALIENTE_EXTRUIR6_DEPTH)

    # Croquis18 → Saliente-Extruir7 (add)
    with BuildSketch(Plane.XY.offset(3)):
        with Locations((0, -33.75)):
            Circle(CROQUIS18_R)
    extrude(amount=-SALIENTE_EXTRUIR7_DEPTH)

    # Redondeo1
    # the kernel refuses this fillet: 10 mm, written as the material it adds along each edge
    with BuildSketch(Plane(origin=(-71.5, -25.75, 3), x_dir=(0, 0.731390625538099, 0.6819587618580675), z_dir=(1, 0, 0))) as redondeo1_piece_1:
        with BuildLine():
            CenterArc((REDONDEO1_R * 0.393879204265, REDONDEO1_R), REDONDEO1_R, 227.003102128, 42.996897872)
            Line((-REDONDEO1_R * 0.288079557594, REDONDEO1_R * 0.268609374462), (0, 0))
            Line((0, 0), (REDONDEO1_R * 0.393879204265, 0))
        make_face()
    extrude(amount=143)

    # Croquis19 → Saliente-Extruir8 (add)
    # profile 1 of 2: a face of its own
    with BuildSketch(Plane.XY.offset(3)):
        with Locations((-79.5, -12.1)):
            Circle(CROQUIS19_R)
        with Locations((-79.5, -12.1)):
            Circle(CROQUIS19_R_2, mode=Mode.SUBTRACT)
    # profile 2 of 2: a face of its own
    with BuildSketch(Plane.XY.offset(3)):
        with Locations((79.5, -12.1)):
            Circle(CROQUIS19_R)
        with Locations((79.5, -12.1)):
            Circle(CROQUIS19_R_3, mode=Mode.SUBTRACT)
    extrude(amount=-SALIENTE_EXTRUIR8_DEPTH)


solid = part.part
